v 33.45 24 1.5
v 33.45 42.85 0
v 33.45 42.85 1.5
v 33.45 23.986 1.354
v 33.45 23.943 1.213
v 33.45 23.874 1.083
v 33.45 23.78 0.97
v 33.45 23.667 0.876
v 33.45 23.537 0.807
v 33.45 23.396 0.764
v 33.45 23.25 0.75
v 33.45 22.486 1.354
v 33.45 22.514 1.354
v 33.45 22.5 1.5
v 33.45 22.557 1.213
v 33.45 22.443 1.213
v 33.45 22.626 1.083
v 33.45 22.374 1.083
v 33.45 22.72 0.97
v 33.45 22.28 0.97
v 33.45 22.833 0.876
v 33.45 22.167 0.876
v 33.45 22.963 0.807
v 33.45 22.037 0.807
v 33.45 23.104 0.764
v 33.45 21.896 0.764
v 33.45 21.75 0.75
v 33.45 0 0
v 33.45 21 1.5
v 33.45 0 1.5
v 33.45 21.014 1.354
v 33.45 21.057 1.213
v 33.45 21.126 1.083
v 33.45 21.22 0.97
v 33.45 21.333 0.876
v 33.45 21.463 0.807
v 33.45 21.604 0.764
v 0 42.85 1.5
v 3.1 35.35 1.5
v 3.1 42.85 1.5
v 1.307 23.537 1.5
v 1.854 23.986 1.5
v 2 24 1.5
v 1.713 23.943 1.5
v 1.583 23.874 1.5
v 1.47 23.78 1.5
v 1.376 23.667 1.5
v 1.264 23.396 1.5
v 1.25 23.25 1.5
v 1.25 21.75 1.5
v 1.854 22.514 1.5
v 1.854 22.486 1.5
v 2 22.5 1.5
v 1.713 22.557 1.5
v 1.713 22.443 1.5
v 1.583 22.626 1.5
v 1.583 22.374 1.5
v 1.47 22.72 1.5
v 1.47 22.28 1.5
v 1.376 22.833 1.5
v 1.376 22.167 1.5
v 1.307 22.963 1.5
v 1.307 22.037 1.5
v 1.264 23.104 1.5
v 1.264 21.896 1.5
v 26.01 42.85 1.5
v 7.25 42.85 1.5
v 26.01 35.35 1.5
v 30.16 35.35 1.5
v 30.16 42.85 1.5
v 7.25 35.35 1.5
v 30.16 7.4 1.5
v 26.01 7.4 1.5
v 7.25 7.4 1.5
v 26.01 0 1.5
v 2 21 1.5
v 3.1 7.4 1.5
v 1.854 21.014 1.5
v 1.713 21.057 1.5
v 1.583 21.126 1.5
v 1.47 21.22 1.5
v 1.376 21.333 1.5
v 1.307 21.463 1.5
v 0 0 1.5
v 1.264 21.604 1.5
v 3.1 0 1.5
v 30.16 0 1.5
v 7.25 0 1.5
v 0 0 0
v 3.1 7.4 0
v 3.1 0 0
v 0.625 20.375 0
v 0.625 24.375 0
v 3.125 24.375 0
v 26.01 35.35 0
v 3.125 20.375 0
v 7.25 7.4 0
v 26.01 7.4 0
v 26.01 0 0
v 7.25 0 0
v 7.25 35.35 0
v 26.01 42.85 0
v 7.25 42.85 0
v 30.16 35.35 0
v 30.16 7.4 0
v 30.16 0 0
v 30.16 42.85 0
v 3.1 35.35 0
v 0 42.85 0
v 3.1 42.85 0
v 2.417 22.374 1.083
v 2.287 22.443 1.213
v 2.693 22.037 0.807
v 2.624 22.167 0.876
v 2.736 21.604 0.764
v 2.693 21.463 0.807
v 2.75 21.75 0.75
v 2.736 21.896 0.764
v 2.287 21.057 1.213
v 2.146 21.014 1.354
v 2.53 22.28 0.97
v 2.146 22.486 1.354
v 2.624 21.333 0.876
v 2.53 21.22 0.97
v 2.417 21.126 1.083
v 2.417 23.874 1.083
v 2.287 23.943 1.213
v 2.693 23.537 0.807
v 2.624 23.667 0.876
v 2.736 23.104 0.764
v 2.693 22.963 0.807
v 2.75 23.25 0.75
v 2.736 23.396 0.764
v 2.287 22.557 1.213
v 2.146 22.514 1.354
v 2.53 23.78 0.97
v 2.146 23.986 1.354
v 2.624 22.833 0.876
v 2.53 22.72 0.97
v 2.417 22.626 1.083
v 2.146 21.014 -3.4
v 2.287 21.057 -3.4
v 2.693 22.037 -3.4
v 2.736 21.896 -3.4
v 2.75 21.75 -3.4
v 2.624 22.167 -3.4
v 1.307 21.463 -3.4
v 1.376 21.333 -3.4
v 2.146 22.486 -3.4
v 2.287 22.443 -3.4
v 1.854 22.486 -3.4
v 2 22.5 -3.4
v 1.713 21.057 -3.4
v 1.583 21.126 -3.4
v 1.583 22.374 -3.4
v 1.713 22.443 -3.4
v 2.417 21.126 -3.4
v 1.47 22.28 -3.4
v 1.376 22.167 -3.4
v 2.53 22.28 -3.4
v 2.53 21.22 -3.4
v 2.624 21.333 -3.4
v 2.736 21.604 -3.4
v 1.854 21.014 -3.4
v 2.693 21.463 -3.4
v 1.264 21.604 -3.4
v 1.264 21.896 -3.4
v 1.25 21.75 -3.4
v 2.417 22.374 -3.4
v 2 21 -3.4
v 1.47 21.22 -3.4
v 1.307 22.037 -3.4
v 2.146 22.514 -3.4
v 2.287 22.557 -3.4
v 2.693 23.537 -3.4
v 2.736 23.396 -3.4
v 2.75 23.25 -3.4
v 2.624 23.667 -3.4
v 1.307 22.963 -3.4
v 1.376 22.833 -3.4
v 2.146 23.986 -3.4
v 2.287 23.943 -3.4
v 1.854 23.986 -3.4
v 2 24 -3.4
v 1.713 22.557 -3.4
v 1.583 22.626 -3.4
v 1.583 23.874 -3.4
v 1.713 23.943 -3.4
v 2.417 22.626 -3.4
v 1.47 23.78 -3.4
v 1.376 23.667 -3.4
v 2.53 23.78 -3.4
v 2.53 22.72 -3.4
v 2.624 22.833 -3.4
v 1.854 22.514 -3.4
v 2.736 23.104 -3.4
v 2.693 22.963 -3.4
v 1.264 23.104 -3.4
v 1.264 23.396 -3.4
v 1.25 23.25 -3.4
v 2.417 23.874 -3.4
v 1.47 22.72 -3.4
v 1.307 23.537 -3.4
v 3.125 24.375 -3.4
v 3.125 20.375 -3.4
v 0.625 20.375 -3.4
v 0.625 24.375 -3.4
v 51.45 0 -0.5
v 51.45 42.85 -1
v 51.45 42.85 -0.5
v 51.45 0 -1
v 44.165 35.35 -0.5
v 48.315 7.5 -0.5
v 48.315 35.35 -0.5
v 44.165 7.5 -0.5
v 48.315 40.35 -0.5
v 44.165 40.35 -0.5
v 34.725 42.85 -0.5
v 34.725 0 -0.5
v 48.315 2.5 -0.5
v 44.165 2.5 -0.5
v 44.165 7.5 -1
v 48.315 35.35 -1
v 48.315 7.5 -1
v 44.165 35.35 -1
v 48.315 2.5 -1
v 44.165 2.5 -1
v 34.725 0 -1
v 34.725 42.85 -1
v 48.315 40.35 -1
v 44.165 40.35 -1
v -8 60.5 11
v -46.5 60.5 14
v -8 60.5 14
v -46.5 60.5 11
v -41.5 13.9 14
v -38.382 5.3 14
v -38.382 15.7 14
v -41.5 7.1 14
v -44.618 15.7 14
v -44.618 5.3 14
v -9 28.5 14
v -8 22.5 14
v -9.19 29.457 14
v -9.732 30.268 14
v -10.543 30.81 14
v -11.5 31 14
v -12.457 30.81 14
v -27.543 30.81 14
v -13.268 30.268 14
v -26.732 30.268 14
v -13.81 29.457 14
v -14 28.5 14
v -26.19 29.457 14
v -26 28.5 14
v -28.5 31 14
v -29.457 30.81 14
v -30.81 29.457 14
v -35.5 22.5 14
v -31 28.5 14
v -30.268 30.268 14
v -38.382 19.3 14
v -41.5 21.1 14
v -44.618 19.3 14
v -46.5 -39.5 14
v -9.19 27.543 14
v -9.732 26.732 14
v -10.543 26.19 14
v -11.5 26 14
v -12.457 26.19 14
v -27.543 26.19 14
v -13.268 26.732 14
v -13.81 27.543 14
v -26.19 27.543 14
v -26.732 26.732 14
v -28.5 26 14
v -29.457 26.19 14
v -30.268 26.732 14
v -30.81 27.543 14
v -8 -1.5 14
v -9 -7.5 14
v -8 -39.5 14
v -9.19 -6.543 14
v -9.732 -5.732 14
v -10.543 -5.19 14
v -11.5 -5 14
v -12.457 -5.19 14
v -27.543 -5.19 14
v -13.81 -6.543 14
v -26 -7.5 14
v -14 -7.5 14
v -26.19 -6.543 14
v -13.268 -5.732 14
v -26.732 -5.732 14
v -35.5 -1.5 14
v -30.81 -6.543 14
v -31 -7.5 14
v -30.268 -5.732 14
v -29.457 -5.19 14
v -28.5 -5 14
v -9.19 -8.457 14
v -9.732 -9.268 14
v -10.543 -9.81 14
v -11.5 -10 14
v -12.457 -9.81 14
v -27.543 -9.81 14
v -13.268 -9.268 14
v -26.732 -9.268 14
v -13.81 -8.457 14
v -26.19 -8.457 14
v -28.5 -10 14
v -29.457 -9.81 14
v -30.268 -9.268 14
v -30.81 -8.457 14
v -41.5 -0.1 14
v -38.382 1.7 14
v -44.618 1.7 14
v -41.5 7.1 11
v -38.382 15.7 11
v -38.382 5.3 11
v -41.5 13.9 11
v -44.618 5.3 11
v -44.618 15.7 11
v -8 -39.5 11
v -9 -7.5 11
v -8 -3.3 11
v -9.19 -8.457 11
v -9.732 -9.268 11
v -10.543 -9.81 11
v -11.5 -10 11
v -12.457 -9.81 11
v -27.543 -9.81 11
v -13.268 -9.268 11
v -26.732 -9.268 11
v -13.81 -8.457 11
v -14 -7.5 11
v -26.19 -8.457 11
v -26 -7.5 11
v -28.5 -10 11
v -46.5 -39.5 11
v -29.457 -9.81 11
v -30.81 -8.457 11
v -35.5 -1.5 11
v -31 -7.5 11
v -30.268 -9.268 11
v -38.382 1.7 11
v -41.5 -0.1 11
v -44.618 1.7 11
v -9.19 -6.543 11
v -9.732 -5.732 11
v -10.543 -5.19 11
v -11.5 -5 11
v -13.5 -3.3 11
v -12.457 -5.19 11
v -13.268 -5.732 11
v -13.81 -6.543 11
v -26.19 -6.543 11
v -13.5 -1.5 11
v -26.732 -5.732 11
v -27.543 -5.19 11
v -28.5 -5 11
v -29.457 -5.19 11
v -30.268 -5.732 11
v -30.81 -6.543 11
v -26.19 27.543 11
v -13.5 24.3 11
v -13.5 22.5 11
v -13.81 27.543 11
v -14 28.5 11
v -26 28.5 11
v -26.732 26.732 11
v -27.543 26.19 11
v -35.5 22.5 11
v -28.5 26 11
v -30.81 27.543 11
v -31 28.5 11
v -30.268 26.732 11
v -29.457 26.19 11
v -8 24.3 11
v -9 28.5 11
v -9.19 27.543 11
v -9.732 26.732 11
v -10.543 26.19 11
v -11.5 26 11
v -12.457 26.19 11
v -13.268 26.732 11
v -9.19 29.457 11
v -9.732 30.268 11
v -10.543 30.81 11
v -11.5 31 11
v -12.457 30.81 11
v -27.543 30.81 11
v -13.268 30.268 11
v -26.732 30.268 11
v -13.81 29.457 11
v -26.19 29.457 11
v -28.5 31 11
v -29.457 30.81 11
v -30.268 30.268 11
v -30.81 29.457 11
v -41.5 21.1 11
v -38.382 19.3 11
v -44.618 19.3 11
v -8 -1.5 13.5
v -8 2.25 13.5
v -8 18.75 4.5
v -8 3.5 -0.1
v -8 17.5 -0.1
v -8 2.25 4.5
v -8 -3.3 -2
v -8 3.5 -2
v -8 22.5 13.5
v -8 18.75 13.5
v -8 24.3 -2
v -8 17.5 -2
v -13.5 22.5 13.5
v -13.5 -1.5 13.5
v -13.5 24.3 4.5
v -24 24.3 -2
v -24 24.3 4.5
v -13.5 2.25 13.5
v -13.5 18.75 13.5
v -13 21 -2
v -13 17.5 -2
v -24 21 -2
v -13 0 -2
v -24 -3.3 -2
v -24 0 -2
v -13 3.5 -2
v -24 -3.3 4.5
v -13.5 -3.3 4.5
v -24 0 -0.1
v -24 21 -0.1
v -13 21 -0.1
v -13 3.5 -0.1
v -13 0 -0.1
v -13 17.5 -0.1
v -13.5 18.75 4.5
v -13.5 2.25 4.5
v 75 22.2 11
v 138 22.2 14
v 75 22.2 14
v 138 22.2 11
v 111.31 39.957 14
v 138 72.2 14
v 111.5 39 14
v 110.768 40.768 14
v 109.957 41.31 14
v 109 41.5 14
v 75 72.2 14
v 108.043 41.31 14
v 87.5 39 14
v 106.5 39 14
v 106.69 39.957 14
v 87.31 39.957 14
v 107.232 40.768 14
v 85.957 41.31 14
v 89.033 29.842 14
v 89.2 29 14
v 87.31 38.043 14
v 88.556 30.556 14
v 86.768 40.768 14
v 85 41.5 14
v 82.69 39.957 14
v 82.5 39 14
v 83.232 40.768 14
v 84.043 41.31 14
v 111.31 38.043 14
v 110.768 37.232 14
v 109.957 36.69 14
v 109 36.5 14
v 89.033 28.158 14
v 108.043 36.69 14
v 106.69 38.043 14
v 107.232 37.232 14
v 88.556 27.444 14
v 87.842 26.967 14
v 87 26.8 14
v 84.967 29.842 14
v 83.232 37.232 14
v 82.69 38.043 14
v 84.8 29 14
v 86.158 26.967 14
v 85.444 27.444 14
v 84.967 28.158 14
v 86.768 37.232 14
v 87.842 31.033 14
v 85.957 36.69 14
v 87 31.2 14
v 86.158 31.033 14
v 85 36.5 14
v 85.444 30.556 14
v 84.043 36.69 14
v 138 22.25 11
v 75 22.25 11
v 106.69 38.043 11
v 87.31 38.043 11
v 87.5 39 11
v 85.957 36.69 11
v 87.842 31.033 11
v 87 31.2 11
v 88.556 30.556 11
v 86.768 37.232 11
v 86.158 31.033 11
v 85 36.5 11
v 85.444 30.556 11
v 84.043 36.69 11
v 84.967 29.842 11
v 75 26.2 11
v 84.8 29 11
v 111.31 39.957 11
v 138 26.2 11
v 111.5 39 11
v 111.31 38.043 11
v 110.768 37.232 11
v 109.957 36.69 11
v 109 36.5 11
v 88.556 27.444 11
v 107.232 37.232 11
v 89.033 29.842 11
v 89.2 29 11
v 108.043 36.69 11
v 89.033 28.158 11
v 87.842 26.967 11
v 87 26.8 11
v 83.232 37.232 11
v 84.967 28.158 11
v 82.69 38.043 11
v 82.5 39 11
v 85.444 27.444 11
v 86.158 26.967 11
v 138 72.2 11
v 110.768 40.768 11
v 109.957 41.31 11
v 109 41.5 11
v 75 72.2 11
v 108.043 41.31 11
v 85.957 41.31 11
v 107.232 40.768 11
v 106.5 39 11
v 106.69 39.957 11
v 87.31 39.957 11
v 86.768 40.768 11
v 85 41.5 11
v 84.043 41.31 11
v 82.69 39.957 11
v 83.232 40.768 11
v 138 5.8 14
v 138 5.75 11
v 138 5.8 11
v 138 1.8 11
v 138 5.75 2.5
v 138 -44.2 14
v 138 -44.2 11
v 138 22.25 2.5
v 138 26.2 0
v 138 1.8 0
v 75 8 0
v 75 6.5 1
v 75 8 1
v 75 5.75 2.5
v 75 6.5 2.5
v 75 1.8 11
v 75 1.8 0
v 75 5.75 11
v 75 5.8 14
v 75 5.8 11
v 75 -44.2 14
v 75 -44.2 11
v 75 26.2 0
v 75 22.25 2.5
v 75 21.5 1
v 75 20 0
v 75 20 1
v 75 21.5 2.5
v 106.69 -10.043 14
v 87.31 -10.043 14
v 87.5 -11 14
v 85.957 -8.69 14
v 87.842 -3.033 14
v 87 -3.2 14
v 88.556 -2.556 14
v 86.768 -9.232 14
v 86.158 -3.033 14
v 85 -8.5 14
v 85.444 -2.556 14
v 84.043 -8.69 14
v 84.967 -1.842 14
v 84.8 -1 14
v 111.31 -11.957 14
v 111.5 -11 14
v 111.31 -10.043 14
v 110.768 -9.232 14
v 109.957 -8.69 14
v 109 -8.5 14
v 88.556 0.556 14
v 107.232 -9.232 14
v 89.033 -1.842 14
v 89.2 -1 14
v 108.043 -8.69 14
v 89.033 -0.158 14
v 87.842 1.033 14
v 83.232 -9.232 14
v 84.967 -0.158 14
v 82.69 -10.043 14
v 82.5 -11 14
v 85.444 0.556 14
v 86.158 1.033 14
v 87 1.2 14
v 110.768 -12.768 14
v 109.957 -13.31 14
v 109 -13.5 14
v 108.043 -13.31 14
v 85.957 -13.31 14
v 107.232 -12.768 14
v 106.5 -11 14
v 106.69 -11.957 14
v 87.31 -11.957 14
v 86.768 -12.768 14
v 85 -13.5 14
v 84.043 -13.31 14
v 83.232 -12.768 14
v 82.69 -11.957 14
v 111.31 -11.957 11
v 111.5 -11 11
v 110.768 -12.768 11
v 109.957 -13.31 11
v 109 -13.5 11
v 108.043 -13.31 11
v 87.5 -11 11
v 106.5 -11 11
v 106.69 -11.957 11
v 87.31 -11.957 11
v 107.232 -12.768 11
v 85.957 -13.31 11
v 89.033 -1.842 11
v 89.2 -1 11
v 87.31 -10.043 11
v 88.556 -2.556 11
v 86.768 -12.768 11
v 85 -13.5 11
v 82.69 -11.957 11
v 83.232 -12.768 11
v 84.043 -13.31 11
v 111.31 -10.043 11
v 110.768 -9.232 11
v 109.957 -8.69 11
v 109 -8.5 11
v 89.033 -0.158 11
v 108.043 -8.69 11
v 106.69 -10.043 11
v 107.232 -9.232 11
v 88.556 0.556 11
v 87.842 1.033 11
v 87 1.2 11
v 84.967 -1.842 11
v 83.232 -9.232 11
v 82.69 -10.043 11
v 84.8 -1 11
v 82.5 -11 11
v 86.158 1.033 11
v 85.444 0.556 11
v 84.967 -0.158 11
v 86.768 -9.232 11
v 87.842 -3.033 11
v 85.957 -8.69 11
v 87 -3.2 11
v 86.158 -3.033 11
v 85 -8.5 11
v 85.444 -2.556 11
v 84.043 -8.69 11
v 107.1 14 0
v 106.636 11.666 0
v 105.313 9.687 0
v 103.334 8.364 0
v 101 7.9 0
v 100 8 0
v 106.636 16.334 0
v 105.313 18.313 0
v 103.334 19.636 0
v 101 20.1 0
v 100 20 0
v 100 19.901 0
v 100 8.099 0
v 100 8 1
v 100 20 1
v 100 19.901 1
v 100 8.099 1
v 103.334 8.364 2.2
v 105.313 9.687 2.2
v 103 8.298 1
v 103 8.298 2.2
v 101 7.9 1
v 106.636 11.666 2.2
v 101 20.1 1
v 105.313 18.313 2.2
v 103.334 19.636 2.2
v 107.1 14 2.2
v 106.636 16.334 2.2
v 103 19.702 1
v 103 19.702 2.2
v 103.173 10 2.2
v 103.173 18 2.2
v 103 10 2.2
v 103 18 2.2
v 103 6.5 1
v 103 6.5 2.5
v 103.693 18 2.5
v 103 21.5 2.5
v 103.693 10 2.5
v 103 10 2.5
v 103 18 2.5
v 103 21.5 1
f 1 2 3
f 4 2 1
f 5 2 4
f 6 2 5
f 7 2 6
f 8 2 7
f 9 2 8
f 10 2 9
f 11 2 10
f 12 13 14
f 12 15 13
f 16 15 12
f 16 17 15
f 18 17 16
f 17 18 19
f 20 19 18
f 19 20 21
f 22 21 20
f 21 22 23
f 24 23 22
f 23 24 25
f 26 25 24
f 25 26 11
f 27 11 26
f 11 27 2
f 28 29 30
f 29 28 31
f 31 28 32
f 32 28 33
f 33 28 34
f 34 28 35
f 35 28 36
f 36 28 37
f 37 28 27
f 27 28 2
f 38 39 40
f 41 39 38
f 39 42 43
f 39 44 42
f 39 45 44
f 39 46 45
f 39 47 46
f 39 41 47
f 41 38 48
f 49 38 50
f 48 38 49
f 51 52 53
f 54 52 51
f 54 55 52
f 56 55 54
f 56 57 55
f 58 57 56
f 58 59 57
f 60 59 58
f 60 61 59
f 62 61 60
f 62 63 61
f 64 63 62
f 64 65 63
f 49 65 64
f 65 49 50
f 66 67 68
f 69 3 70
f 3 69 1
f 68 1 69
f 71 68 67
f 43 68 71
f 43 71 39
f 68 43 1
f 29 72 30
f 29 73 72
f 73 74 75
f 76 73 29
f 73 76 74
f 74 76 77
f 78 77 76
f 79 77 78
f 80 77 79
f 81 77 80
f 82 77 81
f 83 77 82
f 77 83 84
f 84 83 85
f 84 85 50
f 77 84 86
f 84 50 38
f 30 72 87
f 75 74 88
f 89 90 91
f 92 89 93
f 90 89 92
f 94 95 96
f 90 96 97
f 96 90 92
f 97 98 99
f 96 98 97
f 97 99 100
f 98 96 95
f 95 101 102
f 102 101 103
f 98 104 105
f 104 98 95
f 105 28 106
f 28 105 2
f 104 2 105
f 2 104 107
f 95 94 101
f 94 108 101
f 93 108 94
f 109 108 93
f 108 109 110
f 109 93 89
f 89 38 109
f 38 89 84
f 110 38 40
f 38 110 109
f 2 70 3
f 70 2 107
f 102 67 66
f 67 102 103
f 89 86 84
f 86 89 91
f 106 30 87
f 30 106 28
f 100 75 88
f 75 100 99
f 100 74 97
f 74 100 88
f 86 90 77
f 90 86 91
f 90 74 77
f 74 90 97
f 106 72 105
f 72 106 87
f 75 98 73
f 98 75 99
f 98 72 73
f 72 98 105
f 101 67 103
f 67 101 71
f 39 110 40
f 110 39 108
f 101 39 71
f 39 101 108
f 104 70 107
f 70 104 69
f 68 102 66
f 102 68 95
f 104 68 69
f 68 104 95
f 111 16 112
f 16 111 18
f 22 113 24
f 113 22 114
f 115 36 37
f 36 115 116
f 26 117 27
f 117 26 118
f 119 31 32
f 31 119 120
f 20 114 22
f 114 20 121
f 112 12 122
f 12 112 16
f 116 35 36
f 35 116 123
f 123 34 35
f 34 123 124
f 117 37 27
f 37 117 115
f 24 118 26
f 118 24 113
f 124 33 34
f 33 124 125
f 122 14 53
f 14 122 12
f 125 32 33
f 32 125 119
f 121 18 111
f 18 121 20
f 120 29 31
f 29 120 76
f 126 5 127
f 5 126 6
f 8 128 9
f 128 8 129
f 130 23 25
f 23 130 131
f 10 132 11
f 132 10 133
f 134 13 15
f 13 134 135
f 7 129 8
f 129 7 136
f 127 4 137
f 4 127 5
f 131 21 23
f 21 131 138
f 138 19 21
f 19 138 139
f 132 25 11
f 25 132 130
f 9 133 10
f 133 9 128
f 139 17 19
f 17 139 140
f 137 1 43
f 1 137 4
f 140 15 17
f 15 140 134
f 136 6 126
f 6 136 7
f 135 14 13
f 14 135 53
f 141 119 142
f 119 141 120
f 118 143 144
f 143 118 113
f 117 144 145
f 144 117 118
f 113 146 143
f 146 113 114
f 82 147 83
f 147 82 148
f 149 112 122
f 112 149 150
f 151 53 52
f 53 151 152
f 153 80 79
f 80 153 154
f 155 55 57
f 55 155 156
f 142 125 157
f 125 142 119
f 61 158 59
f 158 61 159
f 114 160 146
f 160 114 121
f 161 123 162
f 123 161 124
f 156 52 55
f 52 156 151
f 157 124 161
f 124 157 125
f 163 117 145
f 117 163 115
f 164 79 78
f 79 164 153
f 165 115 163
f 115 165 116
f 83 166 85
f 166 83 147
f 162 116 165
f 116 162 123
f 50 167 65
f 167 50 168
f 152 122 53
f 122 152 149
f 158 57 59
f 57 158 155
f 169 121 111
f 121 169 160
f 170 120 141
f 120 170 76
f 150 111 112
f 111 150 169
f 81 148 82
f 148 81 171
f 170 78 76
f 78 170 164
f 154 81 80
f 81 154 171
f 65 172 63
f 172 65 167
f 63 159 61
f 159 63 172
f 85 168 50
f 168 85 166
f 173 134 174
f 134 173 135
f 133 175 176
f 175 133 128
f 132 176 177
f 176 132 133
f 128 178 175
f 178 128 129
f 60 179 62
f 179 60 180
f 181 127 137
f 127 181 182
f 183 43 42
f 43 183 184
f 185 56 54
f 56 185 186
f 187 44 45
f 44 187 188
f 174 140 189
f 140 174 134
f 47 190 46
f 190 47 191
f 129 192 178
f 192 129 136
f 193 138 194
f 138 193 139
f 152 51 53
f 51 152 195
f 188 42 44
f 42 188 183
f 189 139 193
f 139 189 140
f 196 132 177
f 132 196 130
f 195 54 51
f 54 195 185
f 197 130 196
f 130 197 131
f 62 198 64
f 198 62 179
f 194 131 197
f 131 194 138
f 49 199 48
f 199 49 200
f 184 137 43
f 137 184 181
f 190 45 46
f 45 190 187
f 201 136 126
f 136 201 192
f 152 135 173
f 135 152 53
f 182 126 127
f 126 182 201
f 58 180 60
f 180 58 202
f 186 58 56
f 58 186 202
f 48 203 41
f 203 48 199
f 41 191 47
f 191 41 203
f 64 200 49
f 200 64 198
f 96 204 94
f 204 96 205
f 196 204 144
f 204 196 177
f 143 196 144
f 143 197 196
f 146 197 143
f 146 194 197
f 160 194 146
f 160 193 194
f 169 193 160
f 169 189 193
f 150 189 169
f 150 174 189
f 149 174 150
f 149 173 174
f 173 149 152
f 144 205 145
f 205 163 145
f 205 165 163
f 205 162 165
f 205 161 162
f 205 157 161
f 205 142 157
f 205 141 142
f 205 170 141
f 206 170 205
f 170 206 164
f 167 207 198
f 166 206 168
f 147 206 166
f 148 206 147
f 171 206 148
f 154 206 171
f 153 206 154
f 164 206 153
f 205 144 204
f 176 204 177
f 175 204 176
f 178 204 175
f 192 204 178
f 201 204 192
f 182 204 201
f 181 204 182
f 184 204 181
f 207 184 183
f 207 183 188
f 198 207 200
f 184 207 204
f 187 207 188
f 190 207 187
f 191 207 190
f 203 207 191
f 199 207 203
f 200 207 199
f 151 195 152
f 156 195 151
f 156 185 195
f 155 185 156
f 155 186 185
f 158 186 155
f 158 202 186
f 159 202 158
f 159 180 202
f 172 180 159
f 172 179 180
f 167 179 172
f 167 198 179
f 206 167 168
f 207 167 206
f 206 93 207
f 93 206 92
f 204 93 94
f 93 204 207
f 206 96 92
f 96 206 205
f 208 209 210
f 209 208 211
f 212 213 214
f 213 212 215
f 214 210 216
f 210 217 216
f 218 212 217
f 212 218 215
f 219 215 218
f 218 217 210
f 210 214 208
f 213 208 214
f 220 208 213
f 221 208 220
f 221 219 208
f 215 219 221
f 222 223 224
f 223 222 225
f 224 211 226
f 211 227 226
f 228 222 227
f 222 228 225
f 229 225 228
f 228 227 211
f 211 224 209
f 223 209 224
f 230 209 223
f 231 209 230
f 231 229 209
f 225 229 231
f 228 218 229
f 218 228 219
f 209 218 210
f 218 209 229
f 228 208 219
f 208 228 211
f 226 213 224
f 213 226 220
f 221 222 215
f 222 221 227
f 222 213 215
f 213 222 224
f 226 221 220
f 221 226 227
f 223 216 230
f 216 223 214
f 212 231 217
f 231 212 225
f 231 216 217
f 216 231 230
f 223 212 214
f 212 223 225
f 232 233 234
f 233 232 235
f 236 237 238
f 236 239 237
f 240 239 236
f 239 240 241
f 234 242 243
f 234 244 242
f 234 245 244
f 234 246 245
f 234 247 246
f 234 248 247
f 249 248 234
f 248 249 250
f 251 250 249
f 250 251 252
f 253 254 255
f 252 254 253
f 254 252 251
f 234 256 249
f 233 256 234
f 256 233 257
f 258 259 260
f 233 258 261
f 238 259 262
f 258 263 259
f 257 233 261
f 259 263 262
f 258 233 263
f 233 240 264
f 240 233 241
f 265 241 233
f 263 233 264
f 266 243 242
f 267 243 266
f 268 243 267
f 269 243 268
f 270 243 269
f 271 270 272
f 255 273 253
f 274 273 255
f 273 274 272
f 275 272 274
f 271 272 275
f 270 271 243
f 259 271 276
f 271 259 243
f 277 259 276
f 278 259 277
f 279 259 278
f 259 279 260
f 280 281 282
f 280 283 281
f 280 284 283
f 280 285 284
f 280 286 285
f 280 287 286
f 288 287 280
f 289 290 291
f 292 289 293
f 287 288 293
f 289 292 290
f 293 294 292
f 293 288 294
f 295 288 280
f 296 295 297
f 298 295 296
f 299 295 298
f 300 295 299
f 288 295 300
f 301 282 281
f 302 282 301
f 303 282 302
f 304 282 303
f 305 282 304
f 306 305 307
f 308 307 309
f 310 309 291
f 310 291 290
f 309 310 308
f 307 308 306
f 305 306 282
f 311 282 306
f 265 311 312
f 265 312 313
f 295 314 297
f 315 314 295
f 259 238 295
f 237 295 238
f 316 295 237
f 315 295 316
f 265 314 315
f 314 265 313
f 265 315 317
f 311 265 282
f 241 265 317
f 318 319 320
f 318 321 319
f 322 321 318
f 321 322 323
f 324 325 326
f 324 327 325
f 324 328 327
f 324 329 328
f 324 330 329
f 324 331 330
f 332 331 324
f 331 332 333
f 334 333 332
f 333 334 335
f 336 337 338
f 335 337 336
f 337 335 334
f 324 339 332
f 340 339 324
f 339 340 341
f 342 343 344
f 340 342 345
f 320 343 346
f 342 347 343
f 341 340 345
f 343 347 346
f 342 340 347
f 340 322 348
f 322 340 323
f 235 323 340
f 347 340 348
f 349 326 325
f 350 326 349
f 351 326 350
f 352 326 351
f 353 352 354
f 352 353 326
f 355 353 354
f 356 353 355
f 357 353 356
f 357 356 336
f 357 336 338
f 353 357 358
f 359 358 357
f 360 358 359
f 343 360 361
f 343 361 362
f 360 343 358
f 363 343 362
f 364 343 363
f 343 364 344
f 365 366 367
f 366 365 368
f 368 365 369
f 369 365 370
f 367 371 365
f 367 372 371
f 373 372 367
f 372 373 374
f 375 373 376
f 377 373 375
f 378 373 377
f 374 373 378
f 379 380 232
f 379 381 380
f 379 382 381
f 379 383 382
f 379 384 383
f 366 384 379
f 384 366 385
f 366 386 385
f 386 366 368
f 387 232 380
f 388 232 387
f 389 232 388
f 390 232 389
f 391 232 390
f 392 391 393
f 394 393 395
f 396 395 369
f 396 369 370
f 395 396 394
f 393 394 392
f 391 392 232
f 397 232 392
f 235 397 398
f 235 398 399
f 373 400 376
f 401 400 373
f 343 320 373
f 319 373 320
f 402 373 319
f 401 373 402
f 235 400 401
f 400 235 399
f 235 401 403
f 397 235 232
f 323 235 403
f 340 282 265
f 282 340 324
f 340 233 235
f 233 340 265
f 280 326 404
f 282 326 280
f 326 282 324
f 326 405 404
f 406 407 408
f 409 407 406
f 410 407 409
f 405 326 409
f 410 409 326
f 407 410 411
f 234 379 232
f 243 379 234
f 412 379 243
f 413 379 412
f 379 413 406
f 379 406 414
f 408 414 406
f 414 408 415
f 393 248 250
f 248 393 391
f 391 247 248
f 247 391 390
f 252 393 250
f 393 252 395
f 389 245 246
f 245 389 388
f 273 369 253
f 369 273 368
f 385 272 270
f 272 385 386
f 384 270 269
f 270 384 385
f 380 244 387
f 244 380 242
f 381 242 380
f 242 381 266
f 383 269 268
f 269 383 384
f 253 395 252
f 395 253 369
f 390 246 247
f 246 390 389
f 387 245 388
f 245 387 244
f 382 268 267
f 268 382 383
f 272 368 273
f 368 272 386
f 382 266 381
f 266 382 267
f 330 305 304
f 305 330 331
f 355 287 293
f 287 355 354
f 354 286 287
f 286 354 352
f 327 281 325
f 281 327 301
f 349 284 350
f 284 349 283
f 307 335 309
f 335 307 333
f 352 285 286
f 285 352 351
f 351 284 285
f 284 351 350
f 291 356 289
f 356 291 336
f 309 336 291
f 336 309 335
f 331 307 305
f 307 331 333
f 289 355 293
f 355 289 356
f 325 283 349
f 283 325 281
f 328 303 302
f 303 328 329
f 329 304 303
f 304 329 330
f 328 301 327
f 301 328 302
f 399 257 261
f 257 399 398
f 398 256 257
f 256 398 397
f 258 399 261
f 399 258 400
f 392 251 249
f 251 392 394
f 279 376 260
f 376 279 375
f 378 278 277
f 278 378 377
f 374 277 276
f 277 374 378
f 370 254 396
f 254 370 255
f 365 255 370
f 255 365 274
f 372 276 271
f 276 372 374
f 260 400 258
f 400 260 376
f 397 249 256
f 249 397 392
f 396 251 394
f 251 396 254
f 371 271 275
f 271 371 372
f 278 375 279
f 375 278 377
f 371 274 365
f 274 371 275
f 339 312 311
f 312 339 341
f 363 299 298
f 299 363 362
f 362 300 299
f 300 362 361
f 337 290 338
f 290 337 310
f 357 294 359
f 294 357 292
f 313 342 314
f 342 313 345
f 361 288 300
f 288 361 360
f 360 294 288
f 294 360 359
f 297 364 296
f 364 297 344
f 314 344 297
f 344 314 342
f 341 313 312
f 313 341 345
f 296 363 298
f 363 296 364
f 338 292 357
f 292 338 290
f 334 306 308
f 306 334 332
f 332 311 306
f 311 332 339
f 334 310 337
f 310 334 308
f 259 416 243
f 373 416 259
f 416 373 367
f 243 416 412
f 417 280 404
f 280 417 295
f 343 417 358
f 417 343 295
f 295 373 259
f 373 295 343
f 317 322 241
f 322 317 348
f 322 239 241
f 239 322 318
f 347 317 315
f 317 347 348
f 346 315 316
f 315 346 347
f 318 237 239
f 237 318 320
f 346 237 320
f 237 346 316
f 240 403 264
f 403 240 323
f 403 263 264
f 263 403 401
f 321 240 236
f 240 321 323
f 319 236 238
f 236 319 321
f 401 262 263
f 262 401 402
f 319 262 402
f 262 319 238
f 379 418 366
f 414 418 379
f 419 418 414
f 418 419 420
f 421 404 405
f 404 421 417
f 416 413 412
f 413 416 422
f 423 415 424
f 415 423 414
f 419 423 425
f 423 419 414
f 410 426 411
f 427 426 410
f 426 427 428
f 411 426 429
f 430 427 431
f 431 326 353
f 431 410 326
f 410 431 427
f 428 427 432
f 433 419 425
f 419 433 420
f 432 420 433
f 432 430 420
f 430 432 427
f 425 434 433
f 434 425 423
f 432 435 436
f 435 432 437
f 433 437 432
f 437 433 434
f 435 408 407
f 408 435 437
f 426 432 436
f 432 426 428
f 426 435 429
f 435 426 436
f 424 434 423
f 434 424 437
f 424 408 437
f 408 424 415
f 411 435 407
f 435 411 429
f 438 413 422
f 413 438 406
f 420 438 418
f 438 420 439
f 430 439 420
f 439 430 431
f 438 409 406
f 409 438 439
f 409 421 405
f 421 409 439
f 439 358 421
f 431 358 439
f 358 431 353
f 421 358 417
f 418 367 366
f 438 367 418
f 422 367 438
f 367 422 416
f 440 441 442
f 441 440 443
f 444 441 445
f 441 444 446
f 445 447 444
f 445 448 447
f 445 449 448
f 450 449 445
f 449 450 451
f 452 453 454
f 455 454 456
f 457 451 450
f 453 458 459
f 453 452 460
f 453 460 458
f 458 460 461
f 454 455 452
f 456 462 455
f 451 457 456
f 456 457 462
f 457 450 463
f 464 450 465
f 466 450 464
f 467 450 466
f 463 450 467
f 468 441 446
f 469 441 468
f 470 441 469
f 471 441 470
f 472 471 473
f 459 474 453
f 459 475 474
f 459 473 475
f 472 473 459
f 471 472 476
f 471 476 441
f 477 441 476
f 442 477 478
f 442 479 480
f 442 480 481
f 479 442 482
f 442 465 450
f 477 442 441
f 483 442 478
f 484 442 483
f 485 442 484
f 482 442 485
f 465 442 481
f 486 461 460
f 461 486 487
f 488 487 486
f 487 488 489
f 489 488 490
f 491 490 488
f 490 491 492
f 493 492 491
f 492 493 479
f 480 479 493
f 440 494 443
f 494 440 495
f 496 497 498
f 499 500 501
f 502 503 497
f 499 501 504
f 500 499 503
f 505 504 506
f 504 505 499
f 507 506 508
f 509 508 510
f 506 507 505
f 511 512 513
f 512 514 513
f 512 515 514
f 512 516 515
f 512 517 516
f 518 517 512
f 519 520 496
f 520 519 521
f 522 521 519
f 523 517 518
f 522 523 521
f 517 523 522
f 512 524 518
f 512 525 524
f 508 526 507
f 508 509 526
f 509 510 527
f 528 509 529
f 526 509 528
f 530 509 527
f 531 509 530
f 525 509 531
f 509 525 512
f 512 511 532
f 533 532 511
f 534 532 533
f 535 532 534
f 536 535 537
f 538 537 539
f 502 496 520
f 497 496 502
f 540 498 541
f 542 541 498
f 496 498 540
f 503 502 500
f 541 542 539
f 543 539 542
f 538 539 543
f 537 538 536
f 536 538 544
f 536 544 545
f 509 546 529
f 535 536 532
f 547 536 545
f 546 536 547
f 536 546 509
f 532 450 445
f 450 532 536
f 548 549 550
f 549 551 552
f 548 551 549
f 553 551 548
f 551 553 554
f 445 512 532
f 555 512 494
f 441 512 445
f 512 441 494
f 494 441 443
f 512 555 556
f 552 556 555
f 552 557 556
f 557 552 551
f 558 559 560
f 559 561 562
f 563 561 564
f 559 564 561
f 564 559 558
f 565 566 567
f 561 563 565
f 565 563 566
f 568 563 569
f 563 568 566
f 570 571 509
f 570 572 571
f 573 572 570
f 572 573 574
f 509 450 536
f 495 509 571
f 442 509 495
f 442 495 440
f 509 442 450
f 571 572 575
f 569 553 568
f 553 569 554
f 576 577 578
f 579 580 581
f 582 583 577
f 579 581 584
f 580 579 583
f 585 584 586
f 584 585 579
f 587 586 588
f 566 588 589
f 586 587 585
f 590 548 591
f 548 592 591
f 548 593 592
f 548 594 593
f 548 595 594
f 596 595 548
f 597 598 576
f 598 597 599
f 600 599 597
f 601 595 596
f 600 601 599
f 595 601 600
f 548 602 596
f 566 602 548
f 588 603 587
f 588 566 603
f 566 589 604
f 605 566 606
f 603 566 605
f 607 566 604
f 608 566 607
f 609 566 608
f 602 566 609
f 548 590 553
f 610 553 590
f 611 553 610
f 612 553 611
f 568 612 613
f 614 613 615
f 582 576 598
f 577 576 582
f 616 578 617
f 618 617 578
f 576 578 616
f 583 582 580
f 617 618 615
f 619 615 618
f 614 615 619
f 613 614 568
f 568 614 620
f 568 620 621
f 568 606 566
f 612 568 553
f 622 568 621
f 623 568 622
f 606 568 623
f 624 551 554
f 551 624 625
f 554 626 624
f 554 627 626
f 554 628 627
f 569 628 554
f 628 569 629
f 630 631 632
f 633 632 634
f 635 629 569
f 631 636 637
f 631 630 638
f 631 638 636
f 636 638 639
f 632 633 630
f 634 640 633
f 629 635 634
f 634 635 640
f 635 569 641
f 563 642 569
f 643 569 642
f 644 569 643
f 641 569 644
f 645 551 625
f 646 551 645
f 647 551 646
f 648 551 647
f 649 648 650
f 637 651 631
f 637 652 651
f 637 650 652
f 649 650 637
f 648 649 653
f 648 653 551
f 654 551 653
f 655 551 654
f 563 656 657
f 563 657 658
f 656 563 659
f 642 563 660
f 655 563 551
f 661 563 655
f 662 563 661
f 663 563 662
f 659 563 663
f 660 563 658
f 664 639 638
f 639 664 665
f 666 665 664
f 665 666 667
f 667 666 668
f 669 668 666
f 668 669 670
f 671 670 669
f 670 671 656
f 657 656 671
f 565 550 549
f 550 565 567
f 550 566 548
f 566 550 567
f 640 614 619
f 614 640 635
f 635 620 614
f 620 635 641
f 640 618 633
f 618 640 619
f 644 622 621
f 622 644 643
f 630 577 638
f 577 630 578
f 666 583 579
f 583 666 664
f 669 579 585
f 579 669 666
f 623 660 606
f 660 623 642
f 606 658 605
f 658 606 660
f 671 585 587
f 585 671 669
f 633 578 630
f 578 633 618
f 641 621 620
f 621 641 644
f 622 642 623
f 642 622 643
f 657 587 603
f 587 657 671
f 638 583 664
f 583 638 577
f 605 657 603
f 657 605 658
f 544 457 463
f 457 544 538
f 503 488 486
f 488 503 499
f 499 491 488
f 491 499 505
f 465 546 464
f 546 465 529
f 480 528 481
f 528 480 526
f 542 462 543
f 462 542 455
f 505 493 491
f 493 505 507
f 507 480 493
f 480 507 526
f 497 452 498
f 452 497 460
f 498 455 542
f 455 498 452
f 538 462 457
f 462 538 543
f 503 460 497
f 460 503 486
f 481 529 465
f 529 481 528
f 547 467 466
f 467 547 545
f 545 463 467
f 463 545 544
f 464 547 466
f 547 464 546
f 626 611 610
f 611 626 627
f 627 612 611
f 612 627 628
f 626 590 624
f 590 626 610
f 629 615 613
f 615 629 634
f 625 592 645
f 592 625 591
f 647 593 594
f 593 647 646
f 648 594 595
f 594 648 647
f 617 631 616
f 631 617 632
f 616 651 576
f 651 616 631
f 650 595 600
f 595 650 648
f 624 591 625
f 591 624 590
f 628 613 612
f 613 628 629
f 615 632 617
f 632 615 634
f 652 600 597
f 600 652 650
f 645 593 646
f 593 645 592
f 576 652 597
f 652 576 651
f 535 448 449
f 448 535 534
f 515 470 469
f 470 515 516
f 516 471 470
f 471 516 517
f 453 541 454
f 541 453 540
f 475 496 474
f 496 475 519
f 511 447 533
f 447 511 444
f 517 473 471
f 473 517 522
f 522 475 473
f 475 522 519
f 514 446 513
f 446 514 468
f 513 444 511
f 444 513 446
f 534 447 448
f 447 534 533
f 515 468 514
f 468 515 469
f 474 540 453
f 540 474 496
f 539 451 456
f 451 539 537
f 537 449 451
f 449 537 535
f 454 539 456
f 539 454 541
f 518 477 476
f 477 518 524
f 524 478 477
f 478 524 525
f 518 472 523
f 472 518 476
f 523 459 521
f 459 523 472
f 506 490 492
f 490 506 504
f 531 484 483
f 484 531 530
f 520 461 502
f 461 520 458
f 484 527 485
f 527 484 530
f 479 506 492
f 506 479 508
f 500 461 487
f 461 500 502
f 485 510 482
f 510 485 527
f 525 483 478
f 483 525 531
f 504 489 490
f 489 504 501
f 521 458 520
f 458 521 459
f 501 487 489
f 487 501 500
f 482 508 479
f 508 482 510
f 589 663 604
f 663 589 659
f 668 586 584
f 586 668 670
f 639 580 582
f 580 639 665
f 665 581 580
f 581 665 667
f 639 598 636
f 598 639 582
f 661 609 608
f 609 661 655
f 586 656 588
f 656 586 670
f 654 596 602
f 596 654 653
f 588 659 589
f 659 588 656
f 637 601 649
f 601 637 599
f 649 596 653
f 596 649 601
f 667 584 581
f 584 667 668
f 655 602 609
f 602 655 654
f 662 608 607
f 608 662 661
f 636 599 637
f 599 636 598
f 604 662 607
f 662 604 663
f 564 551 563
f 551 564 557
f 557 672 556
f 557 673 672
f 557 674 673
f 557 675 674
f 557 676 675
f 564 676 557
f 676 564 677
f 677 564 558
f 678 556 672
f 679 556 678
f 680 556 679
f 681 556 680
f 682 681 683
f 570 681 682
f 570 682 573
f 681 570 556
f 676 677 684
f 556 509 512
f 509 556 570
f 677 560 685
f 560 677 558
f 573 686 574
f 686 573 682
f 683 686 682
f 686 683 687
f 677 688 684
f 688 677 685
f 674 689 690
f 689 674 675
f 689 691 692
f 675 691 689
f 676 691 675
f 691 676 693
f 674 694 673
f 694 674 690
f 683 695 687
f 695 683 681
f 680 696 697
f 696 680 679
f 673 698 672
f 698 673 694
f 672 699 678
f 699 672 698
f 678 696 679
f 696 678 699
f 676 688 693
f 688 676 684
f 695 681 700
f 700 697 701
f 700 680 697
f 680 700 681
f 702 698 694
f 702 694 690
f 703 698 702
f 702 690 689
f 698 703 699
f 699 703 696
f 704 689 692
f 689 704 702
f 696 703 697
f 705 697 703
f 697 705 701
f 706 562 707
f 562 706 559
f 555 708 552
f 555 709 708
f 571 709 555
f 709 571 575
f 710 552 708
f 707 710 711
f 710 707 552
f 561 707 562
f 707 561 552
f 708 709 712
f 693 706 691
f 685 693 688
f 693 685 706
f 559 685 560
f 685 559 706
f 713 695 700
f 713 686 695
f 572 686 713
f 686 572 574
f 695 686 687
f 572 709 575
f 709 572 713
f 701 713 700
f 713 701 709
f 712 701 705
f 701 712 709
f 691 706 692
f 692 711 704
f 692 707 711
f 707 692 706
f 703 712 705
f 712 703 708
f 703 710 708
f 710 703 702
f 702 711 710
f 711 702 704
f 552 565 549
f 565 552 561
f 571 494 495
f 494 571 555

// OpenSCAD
//translate([49,25,8])
union () {
difference () {
cube([33.45,42.85,1.5]);

//Screw Cubes
//top left
translate([3.1,-0.1,-0.1])
cube([4.15,7.5,4.2]);

//bottom left
translate([26.01,-0.1,-0.1])
cube([4.15,7.5,4.2]);

//top right
translate([3.1,35.35,-0.1])
cube([4.15,7.5,4.2]);

//bottom right
translate([26.01,35.35,-0.1])
cube([4.15,7.5,4.2]);

rotate([0,90,0])
translate([-1.5,21.75,2])
cylinder(d=1.5, h=34, $fn=32);

rotate([0,90,0])
translate([-1.5,23.25,2])
cylinder(d=1.5, h=34, $fn=32);

translate([2,21.75,-1.3])
cylinder(d=1.5, h=4.7, $fn=32);

translate([2,23.25,-1.3])
cylinder(d=1.5, h=4.7, $fn=32);
}

translate([0.625,20.375,-3.4])
difference () {
cube([2.5,4,4]);

translate([1.375,1.375,-.1])
cylinder(d=1.5, h=4.7, $fn=32);

translate([1.375,2.875,-.1])
cylinder(d=1.5, h=4.7, $fn=32);


}
}


//Plate for Tubing Pressure
translate([34.725,0, -1])
difference () {
cube([16.725,42.85,0.5]);
    
    translate([9.44,2.5,0])
    cube([4.15,5,4.2]);

    translate([9.44,35.35,0])
    cube([4.15,5,4.2]);    
}






module MiSeqPressurePlate(){
    translate([0,30,0])
union(){
    difference() {
        translate([-50,1.5,2])        //base
            cube([100,38.5,3]);
        //screw openings
        translate([18,5,0])
            cylinder(r=2.5,h=6,$fn=16);
        translate([-18,5,0])
            cylinder(r=2.5,h=6,$fn=16);
        translate([18,22,0])
            cylinder(r=2.5,h=6,$fn=16);
        translate([-18,22,0])
            cylinder(r=2.5,h=6,$fn=16);
        //interface opening
        translate([-12,0,0]) 
            cube([24,29,5]);
    //fitting holes 
        translate([-7,35,0])         
            cylinder(r=3.6,h=6,$fn=6);
        translate([7,35,0])
            cylinder(r=3.6,h=6,$fn=6);
    }
    //gasket holder  
    difference(){
        //base  
        translate([-13.8,1.5,-11])  
            cube([27.6,16,15.5]);
        //gasket slot
        translate([-10.5,6.5,-11])
            cube([21,17.5,1.9]);
        translate([-7,1.5,-11])
            cube([14,17.5,1.9]);
        
        // Cube to widen the rectangular opening from above the chip notch
            translate([-8.25,-1,-4.5]) // Position the cube further up above the chip notch
            cube([16.5, 70, 14.5]); // Adjust the dimensions as needed
        
        // Cube to widen the rectangular opening from above the chip notch
            translate([-15.25,7,-4.5]) // Position the cube further up above the chip notch
            cube([32, 80, 50]); // Adjust the dimensions as needed

        }
        
}}

module MiSeqCradle (){
    color ("purple");
    
    translate([0,30,0])
    union() {
        difference() {
            union(){
                translate([-58.2,0,8])      //base left
                    cube([50,63,3]);
                translate([8.2,0,8])        //base right
                    cube([50,63,3]);
            }
            translate([25,10,7])        //screw openings
                cylinder(r=2.5,h=6,$fn=16);
            translate([-25,10,7])
                cylinder(r=2.5,h=6,$fn=16);
            translate([25,34,7])
                cylinder(r=2.5,h=6,$fn=16);
            translate([-25,34,7])
                cylinder(r=2.5,h=6,$fn=16);
            translate([-6.2,0,6])       //prism opening
                cube([12.4,32,9]);
            translate([-15,12,7])       //heater screw openings
                cylinder(r=2.2,h=6,$fn=16);
            translate([15,12,7])       
                cylinder(r=2.2,h=6,$fn=16);   
        }
        difference() {
            translate([-12.2,0,-3])
                cube([24.4,63,12]);
            translate([-6,0,-4])        //scope opening
                cube([12,25,12]);
            translate([0,26,-7])
                cylinder(r=6.1,h=6.2,$fn=16);
            translate([-7.5,0,-2]) 
                cube([15,28,1.5]);      //chip notch
            translate([-6.2,0,-0.7]) 
                cube([12.4,28,9.7]);    //prism opening
            translate([-4,28,-0.9])     //top laser bevel
                rotate([30,0,0]){
                    cube([8,35,7.7]);
            }  
            // Cube to widen the rectangular opening from above the chip notch
            translate([-8.25,-1,-0.5]) // Position the cube further up above the chip notch
                cube([16.5, 70, 10]); // Adjust the dimensions as needed
        }  
        
    }
}


translate([23.5,10.5,9])
    rotate([0,0,90]){
    MiSeqPressurePlate();}
translate([21,3.5,0.5])

translate([24,10.5,2.5])
    rotate([0,0,-90]){
        MiSeqCradle();}
